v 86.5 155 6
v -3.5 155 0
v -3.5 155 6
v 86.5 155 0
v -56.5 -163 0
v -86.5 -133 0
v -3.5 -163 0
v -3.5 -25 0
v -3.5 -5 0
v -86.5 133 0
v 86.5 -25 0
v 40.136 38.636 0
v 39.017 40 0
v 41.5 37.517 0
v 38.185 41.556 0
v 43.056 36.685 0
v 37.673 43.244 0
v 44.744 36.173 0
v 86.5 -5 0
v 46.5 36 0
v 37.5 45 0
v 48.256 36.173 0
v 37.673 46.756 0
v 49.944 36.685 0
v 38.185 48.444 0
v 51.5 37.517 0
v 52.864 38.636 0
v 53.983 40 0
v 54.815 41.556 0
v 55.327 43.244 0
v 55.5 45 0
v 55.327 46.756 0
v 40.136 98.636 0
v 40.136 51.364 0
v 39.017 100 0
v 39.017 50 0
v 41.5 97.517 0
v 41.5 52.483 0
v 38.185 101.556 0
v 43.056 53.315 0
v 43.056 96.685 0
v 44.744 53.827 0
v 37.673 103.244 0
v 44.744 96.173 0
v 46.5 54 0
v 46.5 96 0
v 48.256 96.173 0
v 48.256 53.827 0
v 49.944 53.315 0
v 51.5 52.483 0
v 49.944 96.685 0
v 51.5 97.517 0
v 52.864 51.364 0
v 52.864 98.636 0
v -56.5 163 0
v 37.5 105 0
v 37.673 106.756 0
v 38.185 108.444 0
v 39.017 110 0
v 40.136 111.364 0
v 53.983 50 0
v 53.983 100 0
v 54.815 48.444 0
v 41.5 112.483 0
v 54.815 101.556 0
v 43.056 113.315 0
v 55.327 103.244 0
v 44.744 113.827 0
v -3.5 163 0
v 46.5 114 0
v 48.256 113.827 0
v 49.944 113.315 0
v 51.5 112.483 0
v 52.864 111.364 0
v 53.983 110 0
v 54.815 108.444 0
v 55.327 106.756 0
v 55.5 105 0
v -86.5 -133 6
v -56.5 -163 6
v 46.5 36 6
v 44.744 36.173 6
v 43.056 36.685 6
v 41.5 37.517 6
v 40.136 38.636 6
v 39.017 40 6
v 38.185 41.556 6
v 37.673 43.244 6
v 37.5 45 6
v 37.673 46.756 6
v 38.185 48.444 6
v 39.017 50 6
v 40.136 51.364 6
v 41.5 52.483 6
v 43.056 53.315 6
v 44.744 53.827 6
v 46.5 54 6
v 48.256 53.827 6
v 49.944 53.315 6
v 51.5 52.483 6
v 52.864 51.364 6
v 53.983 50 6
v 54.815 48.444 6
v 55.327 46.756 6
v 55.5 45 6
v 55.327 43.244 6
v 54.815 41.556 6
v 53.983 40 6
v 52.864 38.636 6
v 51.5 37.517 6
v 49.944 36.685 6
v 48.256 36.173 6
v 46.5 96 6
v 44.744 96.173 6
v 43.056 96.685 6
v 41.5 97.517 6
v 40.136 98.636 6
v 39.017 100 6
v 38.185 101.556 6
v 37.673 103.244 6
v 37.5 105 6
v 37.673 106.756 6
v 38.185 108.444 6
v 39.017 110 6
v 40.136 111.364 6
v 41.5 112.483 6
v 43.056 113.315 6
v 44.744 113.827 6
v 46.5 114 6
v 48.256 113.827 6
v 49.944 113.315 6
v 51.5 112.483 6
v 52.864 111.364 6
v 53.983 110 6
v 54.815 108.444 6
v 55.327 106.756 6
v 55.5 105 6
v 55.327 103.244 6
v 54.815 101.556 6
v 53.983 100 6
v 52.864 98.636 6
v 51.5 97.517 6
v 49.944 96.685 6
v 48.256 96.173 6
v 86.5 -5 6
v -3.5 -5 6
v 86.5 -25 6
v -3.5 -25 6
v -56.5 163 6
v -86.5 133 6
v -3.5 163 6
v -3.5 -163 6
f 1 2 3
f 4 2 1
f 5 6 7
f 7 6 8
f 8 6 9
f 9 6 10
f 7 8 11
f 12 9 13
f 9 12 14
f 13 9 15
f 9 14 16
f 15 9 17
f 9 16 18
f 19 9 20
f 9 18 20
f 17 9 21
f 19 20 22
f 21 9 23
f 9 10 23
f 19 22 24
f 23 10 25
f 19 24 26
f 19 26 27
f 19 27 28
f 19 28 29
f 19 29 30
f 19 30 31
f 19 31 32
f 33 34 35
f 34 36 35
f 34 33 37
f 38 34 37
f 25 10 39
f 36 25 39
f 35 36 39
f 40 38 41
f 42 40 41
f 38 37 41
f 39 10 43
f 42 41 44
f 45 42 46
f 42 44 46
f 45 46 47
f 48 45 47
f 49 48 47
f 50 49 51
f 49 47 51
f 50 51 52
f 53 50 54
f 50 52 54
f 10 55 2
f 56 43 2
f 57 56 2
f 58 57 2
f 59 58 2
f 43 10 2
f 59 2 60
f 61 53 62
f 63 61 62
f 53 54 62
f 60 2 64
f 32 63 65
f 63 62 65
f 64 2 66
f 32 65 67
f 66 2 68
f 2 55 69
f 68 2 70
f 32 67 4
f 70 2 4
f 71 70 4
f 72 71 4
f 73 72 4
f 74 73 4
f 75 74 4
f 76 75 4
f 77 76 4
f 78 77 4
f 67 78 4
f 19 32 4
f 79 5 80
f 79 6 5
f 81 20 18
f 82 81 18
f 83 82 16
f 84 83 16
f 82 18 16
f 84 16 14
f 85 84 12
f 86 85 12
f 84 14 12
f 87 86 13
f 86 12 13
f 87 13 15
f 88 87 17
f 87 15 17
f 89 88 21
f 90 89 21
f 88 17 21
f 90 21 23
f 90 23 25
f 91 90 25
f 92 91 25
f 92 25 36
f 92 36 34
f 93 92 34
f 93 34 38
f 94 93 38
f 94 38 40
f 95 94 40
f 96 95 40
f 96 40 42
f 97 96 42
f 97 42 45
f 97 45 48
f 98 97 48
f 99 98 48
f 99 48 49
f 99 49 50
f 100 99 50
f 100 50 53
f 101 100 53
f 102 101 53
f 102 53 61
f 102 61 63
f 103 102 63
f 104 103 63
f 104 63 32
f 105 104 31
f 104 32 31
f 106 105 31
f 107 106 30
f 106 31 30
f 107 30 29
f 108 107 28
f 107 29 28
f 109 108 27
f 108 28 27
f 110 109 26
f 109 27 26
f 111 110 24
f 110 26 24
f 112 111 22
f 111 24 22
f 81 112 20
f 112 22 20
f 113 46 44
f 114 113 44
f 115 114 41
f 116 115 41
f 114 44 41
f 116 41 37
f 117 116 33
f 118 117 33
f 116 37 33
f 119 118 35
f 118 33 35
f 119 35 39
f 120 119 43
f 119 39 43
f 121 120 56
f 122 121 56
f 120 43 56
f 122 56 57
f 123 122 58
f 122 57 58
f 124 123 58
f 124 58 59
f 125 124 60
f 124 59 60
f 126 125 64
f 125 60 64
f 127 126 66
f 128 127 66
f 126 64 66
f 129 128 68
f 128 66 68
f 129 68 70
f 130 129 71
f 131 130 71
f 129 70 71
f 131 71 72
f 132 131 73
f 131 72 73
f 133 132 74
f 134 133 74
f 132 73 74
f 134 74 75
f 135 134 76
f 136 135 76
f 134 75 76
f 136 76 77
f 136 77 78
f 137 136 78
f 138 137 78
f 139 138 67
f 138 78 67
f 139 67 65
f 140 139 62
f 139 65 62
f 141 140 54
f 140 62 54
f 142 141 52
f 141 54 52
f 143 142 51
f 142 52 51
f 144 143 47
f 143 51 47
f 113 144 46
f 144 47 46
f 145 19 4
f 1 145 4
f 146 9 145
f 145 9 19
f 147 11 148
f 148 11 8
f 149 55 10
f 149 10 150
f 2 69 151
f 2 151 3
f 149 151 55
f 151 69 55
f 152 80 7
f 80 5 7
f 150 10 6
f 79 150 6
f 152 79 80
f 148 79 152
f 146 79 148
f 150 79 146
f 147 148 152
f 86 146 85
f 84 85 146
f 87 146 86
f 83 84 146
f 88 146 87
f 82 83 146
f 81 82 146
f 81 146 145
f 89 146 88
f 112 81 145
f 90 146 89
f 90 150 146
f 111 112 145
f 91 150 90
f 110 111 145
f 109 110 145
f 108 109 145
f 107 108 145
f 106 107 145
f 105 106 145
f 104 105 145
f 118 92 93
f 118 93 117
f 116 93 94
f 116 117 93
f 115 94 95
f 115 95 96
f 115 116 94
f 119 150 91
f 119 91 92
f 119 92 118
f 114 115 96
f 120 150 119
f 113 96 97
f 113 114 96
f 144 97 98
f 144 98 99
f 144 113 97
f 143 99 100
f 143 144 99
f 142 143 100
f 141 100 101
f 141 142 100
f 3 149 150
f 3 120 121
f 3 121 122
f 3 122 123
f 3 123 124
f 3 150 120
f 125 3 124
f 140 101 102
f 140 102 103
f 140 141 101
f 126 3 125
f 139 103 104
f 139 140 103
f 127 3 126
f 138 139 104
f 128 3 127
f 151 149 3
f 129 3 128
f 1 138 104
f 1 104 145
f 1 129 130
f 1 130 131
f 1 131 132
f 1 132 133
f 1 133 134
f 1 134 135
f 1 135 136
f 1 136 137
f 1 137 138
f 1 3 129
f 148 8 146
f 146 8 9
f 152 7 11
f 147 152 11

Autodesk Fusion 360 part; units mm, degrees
sketch "スケッチ1" plane through (0, 0, 0) normal (0, 0, 1) x (1, 0, 0)
  line L0 (-3.5, 163) -> (-86.5, 163)
  line L1 (-86.5, 163) -> (-86.5, -163)
  line L2 (-86.5, -163) -> (-3.5, -163)
  line L3 (86.5, -5) -> (86.5, 155)
  line L4 (82.2546, 155) -> (-86.5, -163) construction
  line L5 (-86.5, 163) -> (46.1223, -86.9125) construction
  line L6 (-3.5, 163) -> (-3.5, 155)
  line L7 (-3.5, 155) -> (86.5, 155)
  line L8 (-86.5, -163) -> (-3.5, -163) construction
  line L9 (-3.5, -163) -> (86.5, -25)
  line L10 (86.5, -25) -> (-3.5, -25)
  line L11 (-3.5, -25) -> (-3.5, -5)
  line L12 (-3.5, -5) -> (86.5, -5)
  dimension "d2" = 326
  dimension "d5" = 83
  dimension "d7" = 90
  dimension "d8" = 20
extrude "押し出し1" add sketch "スケッチ1" along normal blind 6
chamfer "面取り1" distance 30 angle 45 2 edges at (-86.5, -163, 3) (-86.5, 163, 3)
sketch "スケッチ2" plane through (0, 0, 6) normal (0, 0, 1) x (-1, 0, 0)
  line L0 (56.5, -163) -> (86.5, -133)
  line L1 (86.5, -133) -> (86.5, 133)
  line L2 (86.5, 133) -> (56.5, 163)
  line L3 (56.5, 163) -> (3.5, 163)
  line L4 (3.5, 163) -> (-86.5, 25)
  line L5 (-86.5, 25) -> (3.5, 25)
  line L6 (3.5, 25) -> (3.5, 5)
  line L7 (3.5, 5) -> (-86.5, 5)
  line L8 (-86.5, 5) -> (-86.5, -155)
  line L9 (-86.5, -155) -> (3.5, -155)
  line L10 (3.5, -155) -> (3.5, -163)
  line L11 (3.5, -163) -> (56.5, -163)
  line L12 (-86.5, -155) -> (-46.5, -155) construction
  line L13 (-46.5, -155) -> (-46.5, -105) construction
  line L14 (-46.5, -105) -> (-86.5, -105) construction
  line L15 (-86.5, -105) -> (-86.5, -155) construction
  line L16 (-46.5, -105) -> (-46.5, -45) construction
  point P0 (-46.5, -105)
  point P1 (-46.5, -45)
  dimension "d12" = 40
  dimension "d13" = 50
  dimension "d14" = 60
hole "穴1" at (46.5, 105, 6) at (46.5, 45, 6) direction (0, 0, -1) diameter 18 end through all
equation "d5 = 30 mm + 53 mm"
